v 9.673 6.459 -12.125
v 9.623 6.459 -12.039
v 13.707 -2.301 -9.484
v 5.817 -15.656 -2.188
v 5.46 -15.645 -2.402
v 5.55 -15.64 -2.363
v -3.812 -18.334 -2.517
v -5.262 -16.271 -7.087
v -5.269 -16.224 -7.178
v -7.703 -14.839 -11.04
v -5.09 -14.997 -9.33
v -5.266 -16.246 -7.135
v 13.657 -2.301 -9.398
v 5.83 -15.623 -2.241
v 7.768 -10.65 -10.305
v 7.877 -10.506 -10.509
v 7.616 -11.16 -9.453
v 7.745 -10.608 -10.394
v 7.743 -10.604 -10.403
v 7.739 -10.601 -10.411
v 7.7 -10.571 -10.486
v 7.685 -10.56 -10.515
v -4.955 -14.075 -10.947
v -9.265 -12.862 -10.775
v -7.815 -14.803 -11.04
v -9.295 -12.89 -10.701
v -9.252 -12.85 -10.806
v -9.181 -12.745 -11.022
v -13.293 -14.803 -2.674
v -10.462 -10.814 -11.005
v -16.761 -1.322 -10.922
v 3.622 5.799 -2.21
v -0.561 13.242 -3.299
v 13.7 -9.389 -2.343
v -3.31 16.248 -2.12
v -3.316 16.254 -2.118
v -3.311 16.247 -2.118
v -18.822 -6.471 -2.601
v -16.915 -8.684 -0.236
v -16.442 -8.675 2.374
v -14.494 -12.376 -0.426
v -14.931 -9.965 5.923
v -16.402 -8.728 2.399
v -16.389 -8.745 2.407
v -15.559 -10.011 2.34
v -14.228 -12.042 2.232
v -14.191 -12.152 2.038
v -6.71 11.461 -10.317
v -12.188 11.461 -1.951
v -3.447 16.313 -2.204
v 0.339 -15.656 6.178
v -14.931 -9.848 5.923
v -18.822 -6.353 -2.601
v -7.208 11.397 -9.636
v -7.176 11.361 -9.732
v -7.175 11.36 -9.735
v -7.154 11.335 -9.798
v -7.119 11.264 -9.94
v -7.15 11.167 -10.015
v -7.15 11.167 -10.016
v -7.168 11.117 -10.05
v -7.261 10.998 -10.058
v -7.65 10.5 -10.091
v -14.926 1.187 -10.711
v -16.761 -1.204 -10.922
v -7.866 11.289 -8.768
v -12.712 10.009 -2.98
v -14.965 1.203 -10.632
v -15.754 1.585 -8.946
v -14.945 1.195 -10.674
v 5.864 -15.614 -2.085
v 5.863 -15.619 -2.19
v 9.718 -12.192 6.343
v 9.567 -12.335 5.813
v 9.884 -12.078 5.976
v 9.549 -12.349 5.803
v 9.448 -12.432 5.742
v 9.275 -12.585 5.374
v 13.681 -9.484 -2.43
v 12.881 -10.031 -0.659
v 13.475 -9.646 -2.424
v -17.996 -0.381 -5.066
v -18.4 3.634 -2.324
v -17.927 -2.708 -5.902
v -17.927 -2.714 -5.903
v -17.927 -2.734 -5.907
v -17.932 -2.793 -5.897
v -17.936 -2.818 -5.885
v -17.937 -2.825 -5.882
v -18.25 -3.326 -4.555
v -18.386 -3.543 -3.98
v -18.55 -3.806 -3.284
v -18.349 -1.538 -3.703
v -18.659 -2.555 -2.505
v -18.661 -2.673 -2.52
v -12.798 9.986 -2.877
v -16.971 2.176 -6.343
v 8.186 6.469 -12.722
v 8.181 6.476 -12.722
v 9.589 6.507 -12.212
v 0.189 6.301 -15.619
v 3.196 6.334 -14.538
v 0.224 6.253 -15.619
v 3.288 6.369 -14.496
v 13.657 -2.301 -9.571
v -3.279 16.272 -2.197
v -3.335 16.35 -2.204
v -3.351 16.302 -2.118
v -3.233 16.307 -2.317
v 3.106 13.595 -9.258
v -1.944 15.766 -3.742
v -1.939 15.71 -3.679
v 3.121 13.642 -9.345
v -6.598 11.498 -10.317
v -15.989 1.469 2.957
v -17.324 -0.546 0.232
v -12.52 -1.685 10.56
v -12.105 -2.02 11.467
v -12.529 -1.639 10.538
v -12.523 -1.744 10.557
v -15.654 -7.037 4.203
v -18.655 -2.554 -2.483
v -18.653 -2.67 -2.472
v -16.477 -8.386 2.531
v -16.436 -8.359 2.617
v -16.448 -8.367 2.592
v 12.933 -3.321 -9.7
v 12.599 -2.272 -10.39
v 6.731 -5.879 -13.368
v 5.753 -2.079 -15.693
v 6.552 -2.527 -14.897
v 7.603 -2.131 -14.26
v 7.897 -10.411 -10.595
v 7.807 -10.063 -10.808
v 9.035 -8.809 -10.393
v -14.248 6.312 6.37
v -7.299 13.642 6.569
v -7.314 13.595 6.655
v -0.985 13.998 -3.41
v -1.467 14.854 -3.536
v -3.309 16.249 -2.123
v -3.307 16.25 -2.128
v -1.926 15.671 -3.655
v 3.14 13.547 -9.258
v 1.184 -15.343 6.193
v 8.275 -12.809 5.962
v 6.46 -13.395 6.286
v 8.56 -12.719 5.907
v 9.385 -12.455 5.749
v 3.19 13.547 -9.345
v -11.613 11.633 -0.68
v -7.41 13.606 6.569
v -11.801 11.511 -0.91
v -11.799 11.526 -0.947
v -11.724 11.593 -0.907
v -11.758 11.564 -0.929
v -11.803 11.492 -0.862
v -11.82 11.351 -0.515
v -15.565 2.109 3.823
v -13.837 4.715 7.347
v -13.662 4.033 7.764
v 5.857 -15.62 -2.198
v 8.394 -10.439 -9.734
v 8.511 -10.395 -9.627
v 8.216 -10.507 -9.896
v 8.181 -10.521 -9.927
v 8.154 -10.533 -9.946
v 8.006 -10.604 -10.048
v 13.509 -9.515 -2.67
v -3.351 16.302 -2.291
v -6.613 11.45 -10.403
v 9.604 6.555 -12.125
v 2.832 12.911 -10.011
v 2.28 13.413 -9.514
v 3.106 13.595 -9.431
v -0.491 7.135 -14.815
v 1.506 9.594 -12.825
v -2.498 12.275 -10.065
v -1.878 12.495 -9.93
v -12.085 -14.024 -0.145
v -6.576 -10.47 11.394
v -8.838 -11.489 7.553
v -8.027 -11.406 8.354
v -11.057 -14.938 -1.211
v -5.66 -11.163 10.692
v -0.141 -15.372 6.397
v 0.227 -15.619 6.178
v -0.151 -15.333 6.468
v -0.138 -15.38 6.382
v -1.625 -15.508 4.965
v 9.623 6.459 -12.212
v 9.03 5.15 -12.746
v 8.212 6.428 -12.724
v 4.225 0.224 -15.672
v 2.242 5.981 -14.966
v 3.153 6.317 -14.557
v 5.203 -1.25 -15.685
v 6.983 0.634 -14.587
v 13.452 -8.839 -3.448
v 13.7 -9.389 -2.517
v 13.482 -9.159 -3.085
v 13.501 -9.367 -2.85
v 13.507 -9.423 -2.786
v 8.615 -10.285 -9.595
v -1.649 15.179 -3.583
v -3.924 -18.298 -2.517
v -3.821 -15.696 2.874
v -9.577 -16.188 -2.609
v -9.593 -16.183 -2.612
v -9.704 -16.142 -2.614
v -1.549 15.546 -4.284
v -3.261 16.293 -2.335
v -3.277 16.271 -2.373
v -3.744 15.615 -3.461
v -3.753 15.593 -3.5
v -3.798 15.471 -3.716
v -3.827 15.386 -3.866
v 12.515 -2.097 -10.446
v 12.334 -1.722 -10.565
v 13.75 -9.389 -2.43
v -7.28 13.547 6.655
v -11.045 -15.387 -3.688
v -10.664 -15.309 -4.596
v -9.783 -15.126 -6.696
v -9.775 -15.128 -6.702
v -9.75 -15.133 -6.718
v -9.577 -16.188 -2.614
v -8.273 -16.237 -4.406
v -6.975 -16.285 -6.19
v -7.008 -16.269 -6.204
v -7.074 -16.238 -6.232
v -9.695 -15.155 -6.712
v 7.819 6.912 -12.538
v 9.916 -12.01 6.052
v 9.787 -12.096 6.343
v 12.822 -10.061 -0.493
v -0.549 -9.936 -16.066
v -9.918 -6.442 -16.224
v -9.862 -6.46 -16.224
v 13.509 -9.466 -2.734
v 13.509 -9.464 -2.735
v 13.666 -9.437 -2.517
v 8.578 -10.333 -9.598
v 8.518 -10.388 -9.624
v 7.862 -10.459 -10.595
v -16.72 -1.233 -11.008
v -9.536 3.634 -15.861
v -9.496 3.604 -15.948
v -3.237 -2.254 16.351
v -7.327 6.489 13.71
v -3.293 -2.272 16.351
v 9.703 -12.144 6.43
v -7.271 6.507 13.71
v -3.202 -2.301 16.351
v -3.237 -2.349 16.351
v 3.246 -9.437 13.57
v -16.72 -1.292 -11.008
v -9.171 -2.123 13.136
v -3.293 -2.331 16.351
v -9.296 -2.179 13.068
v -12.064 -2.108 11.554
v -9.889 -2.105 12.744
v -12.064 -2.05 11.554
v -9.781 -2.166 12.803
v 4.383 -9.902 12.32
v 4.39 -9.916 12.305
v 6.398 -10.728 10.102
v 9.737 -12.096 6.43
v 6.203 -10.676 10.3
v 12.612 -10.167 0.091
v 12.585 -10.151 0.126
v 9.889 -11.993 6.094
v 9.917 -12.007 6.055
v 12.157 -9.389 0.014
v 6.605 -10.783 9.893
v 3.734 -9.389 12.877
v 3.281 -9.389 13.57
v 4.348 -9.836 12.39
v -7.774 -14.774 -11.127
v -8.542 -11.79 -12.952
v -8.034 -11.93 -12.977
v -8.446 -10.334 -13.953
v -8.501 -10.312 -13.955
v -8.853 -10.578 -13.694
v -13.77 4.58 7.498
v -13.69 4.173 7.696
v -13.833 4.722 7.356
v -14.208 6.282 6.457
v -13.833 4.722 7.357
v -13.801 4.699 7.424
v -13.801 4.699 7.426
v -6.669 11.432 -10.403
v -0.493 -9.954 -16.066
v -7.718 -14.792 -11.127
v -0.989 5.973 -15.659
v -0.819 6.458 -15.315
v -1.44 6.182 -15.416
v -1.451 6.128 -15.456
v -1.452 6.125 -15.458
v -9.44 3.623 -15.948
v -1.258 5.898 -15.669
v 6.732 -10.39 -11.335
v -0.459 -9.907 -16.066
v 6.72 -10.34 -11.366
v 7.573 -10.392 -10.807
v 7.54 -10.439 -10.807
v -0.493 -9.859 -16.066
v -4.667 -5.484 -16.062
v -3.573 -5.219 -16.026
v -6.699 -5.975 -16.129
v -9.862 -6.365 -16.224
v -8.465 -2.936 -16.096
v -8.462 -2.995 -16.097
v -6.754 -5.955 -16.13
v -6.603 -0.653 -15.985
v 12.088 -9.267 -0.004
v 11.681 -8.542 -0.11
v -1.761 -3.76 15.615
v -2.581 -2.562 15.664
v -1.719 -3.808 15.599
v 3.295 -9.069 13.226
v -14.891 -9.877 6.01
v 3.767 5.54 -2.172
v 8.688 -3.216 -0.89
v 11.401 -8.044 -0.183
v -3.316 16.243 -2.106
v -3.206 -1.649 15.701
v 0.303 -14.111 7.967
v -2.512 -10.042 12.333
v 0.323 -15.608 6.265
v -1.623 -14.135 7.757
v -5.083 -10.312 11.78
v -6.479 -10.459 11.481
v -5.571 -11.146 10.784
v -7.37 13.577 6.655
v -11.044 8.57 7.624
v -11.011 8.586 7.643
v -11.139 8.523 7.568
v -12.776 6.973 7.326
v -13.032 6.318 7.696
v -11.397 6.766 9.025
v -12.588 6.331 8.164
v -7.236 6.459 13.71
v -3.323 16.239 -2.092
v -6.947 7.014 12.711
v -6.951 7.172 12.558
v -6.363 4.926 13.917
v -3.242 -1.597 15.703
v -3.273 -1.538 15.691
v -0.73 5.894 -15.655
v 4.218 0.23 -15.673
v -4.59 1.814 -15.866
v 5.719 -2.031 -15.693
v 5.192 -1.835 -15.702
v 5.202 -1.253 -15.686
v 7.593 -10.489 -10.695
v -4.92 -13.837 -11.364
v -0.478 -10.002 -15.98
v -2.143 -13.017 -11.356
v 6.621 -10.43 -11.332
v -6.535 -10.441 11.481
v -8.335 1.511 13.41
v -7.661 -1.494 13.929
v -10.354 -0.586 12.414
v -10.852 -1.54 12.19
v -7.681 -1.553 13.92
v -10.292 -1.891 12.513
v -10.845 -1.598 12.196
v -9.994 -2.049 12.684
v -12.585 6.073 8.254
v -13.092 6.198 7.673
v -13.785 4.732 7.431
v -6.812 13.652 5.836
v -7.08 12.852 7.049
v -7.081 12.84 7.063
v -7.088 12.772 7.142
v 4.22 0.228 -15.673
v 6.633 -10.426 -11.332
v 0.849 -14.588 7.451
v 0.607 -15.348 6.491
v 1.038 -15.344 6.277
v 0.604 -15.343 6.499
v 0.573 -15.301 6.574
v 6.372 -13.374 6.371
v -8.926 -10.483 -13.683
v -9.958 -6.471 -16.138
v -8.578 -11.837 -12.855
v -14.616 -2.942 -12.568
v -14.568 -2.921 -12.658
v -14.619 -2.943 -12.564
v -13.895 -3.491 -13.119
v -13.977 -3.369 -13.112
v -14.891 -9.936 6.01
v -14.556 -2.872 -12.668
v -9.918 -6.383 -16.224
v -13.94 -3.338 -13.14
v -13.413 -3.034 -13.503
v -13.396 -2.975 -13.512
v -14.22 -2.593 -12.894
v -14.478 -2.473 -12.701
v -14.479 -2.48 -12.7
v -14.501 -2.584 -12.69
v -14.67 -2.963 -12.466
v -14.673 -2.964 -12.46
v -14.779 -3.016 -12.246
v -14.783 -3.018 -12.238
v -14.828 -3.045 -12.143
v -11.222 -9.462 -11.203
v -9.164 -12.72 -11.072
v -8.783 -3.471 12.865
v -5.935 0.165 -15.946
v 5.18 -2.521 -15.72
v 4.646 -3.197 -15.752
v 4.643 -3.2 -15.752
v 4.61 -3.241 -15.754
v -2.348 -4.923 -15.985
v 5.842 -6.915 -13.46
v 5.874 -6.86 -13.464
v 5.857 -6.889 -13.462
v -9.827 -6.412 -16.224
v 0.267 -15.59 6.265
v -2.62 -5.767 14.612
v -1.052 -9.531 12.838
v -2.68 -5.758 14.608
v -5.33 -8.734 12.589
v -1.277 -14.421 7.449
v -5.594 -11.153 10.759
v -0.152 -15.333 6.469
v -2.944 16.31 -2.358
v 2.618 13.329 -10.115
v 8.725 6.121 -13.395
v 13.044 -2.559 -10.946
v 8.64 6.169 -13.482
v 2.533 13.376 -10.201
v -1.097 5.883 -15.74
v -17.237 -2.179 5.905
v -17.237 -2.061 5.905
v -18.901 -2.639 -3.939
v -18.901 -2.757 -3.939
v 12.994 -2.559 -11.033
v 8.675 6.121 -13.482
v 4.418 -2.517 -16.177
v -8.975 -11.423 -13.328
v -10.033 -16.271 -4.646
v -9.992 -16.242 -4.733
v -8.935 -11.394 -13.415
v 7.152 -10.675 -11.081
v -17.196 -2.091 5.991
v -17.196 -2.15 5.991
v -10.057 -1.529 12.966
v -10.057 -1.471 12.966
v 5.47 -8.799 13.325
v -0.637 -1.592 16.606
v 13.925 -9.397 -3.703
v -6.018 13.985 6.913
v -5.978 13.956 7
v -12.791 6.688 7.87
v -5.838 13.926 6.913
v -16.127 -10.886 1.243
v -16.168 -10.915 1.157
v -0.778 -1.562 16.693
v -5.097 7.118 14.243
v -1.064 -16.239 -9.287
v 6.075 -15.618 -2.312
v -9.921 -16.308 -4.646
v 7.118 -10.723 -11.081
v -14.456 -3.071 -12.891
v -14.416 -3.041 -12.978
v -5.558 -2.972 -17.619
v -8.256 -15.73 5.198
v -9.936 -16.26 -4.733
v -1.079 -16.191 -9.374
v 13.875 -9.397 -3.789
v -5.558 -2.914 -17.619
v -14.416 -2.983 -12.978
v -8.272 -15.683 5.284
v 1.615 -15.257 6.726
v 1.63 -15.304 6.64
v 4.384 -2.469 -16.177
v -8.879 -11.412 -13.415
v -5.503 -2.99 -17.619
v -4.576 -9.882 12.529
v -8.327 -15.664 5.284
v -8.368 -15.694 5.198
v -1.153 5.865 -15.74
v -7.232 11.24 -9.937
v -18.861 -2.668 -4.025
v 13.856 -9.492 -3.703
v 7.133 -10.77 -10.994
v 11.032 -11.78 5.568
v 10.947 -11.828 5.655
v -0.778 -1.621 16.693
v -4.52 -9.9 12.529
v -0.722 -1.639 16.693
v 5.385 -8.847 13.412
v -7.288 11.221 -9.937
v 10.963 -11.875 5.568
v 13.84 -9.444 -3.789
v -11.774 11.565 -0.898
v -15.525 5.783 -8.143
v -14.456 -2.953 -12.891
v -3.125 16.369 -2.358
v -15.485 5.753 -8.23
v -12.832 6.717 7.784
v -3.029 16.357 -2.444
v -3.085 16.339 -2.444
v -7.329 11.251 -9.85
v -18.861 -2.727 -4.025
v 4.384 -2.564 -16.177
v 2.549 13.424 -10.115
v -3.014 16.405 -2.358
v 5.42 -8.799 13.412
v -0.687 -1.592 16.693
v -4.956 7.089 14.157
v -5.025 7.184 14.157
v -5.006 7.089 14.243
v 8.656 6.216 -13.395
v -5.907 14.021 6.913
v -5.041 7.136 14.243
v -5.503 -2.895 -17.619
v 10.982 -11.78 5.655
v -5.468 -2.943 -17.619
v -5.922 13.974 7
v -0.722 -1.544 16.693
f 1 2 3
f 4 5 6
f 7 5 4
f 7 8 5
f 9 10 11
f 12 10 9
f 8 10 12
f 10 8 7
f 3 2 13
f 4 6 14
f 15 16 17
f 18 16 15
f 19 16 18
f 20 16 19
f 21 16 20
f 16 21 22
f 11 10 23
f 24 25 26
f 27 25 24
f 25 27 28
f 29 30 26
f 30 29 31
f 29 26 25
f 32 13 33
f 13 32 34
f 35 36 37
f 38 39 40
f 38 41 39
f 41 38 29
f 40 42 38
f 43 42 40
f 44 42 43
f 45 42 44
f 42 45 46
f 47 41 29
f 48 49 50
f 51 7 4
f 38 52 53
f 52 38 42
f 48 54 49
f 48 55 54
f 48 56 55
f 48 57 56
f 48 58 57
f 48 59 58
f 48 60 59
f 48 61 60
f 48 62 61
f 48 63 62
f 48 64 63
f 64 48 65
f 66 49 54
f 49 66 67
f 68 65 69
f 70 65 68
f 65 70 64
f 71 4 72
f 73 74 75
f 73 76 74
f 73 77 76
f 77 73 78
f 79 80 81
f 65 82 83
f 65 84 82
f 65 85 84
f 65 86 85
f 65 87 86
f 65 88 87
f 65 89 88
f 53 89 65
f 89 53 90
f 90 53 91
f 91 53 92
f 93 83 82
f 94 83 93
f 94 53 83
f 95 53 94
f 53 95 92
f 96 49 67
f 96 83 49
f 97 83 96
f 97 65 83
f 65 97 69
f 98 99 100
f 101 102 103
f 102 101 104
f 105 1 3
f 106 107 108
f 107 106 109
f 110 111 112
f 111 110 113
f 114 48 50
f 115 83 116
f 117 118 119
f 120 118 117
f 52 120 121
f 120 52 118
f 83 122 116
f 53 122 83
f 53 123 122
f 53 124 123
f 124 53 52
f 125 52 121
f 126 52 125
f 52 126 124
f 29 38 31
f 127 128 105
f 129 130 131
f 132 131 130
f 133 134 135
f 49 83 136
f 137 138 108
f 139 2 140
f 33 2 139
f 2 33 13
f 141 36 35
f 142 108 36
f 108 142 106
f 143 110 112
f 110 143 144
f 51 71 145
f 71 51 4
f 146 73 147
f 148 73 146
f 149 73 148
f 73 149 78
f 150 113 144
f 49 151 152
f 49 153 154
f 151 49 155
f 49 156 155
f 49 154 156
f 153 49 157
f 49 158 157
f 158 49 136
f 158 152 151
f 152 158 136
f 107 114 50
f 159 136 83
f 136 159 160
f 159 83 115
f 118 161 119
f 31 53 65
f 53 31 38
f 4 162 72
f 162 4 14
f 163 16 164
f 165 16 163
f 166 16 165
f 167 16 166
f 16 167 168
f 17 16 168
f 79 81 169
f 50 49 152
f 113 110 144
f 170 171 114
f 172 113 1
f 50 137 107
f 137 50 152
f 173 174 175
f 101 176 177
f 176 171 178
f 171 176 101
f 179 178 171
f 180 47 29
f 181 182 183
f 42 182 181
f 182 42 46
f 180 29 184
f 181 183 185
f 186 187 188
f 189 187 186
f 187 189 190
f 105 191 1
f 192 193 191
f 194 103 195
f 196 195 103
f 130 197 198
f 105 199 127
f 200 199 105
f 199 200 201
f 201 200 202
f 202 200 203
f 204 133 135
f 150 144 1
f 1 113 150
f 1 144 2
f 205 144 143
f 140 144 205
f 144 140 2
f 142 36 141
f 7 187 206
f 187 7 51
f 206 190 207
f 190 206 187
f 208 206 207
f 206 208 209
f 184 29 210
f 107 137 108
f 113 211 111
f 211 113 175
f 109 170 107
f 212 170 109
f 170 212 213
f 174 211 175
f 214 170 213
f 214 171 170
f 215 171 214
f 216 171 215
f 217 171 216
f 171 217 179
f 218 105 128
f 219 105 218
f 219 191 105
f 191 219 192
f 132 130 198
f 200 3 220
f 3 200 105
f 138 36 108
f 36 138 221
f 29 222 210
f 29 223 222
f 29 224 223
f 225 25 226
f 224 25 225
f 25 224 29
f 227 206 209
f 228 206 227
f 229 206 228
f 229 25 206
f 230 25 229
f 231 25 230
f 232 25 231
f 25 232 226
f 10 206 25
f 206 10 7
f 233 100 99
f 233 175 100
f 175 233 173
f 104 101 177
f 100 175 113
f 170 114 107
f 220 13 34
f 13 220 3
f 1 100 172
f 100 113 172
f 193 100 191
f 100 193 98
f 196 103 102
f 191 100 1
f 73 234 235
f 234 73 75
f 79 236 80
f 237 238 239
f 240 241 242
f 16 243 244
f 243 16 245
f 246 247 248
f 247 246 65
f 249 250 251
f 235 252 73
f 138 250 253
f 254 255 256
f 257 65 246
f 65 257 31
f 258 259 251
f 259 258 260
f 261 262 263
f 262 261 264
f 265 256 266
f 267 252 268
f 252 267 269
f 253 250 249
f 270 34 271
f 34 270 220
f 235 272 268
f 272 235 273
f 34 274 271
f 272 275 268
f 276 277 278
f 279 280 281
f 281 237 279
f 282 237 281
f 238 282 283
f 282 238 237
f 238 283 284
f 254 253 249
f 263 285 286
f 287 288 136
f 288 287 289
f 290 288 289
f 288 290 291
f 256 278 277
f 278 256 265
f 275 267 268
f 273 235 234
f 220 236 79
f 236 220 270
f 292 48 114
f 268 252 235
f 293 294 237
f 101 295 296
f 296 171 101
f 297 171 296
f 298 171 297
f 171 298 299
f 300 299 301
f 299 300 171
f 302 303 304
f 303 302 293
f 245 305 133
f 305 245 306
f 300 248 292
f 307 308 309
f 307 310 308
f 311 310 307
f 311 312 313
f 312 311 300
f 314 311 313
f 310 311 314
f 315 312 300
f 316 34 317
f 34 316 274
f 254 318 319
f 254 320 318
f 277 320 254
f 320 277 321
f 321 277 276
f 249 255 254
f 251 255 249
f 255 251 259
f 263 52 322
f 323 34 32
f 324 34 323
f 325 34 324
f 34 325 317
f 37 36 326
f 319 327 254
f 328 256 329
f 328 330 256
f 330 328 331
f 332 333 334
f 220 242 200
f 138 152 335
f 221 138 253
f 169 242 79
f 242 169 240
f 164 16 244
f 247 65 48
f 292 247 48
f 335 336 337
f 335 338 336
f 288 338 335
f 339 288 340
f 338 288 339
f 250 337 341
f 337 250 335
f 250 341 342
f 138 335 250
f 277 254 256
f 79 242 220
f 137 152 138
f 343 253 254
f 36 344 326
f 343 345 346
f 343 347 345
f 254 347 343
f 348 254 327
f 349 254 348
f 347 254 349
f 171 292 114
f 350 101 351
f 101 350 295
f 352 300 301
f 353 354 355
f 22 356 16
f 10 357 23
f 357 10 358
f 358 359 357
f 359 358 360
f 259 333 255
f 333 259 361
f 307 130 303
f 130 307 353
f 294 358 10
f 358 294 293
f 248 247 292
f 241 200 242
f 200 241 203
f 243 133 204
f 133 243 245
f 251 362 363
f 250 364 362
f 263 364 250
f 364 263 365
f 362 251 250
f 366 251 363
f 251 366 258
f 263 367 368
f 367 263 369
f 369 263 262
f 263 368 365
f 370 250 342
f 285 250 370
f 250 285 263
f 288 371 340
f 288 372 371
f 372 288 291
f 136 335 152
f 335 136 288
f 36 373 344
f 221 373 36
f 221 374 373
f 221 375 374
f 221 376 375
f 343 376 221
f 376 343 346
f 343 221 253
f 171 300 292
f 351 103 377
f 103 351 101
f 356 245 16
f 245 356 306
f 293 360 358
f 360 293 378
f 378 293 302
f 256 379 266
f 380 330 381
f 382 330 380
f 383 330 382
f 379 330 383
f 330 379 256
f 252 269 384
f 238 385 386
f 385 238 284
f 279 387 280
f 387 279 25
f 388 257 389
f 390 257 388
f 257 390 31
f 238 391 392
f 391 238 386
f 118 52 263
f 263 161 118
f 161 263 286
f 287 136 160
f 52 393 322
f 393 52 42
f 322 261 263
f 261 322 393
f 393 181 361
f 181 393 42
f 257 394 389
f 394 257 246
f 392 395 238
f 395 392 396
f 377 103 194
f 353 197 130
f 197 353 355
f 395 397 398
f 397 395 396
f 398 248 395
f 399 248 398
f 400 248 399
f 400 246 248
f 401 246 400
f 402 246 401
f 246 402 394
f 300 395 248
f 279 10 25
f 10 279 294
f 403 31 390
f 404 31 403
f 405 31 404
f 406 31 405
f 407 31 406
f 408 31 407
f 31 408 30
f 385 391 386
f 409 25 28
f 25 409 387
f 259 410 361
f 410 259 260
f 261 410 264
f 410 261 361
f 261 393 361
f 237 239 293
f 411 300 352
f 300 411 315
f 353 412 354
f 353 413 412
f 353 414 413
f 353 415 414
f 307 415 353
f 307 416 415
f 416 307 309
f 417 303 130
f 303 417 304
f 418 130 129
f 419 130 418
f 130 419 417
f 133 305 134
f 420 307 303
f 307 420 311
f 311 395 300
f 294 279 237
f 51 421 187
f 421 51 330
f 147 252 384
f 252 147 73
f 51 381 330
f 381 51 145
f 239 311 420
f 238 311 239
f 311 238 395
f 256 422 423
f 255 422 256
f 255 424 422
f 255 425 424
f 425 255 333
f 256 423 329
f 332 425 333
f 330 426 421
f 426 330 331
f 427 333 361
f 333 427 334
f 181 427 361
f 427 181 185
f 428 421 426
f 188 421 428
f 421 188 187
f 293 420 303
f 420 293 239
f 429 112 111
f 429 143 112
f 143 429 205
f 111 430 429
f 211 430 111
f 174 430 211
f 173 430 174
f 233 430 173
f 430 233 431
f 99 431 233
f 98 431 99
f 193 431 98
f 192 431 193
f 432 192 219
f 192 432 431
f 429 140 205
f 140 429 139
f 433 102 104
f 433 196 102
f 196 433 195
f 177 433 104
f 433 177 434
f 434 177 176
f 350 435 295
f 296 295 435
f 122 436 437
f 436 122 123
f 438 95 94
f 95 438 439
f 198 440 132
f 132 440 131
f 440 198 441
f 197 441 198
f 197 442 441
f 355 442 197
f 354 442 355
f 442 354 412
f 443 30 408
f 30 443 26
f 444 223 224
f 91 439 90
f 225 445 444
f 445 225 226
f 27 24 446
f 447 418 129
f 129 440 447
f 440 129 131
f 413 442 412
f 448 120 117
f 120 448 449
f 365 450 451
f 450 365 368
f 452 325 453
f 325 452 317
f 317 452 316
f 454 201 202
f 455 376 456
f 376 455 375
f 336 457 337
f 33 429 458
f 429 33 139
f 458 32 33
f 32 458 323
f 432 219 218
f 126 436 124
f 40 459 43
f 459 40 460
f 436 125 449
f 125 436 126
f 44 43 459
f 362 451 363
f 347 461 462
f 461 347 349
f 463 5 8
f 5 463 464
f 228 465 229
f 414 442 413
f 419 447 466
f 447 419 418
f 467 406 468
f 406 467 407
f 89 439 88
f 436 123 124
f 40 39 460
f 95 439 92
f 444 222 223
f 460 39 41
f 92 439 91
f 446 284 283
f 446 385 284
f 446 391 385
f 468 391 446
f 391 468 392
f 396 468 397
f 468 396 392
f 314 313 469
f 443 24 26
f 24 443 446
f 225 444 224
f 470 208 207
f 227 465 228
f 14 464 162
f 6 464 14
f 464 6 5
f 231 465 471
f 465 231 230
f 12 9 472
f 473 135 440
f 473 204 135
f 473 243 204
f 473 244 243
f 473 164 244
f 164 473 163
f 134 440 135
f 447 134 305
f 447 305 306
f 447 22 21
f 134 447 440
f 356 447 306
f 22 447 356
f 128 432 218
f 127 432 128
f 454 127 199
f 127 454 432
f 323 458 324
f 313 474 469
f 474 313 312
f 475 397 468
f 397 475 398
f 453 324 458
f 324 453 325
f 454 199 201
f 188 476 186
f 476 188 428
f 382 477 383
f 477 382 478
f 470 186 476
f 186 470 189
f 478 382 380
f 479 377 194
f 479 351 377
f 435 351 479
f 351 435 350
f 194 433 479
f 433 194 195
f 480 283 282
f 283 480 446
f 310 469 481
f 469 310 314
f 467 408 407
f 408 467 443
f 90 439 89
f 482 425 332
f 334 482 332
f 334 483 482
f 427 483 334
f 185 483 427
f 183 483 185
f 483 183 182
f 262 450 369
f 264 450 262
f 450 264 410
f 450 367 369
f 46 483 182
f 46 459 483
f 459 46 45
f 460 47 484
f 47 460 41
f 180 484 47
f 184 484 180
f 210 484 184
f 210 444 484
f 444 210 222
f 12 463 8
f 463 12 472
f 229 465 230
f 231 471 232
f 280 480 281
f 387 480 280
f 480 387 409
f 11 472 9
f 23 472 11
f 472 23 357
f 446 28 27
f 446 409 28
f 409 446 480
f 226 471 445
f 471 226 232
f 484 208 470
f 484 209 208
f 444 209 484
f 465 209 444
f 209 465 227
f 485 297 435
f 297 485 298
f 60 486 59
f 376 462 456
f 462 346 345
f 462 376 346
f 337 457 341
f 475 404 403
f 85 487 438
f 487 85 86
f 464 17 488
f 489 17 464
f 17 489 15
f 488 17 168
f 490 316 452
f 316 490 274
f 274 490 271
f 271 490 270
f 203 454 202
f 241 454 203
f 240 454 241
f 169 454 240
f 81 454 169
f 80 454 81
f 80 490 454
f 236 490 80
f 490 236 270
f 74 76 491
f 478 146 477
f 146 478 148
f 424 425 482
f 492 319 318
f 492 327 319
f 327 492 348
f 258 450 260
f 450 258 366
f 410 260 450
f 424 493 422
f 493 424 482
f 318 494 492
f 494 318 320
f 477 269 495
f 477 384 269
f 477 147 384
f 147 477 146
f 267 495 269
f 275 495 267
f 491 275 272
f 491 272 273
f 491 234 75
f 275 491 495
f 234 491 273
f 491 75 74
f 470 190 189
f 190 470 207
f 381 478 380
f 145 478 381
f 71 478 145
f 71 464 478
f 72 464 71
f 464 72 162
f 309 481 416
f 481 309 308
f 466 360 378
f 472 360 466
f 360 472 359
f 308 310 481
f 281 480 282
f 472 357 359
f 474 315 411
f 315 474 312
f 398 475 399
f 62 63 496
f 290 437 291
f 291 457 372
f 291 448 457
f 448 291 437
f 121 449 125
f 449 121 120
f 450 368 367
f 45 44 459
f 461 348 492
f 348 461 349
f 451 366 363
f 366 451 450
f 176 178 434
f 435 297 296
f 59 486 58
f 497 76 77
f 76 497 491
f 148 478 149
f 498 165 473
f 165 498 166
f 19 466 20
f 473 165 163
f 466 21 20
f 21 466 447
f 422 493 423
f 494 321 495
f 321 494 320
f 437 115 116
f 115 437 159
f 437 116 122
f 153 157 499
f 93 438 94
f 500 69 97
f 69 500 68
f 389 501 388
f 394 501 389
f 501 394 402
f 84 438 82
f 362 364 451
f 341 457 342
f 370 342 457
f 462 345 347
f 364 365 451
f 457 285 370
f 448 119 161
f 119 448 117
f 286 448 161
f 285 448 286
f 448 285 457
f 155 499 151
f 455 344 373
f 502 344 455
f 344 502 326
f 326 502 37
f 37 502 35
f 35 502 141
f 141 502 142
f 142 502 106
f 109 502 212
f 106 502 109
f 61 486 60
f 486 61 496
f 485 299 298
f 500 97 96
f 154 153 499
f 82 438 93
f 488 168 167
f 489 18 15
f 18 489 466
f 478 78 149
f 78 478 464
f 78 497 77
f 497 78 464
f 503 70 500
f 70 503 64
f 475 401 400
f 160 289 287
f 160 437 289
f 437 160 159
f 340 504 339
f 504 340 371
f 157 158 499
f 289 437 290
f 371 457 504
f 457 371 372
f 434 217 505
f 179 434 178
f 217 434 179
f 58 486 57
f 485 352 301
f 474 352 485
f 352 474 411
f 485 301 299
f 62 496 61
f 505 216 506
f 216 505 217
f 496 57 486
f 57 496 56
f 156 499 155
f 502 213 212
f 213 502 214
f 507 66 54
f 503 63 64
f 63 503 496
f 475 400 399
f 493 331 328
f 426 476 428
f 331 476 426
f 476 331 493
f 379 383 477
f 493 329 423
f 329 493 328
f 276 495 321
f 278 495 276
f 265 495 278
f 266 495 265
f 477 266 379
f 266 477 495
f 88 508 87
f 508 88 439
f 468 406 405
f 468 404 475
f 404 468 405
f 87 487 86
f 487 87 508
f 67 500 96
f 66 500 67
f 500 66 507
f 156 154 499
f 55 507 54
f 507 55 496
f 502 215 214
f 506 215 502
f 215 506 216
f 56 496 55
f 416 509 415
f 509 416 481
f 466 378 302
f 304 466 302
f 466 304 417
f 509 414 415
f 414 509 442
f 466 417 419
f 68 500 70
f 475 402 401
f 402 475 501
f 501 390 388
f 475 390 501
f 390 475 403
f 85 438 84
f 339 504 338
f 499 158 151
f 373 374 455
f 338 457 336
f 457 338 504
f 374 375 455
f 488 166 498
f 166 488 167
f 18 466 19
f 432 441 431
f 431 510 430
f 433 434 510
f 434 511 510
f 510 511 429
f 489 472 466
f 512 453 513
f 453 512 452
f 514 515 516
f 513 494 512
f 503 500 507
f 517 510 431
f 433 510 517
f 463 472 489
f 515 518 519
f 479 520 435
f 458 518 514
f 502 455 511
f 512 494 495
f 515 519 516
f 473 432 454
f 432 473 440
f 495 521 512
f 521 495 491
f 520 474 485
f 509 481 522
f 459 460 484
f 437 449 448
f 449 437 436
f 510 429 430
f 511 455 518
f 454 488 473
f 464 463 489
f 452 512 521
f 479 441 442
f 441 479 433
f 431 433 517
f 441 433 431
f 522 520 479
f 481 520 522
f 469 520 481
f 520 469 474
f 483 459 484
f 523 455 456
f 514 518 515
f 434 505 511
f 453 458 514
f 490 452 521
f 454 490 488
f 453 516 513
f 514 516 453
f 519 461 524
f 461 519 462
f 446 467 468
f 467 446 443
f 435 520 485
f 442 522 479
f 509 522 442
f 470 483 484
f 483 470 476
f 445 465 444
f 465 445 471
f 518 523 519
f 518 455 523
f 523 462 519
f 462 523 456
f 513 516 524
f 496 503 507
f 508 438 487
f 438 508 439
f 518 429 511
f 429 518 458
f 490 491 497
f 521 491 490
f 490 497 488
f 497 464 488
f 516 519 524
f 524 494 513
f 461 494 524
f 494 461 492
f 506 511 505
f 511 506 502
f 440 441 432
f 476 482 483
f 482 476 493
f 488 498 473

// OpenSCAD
// Auto-generated OpenSCAD file

    inner_points = 10*[[-0.45355703407615483, -0.9852604747027949, 1.2442629448836795], [-0.11128666904117222, 0.5835651383085163, -1.565322994036517], [-1.0016741042155215, -0.15000111337832142, 1.287960504788888], [0.1599278591139769, -1.520900805152802, 0.6639822178016064], [-0.7247715622313039, 1.119205468758524, -0.9850422669544439], [0.43683040109819454, -0.25169422301595684, -1.6090205539417255], [-1.2750612603248952, 0.6658365922161982, 0.7783839148588771], [0.604450197740842, -1.5523257042416663, -0.23123416172848094], [-1.1692939008581689, 1.150630367847388, -0.08982588742435665], [0.7102175572075684, -1.0675319286104765, -1.0994439640117146], [-0.07373926097703089, -0.15917918368749281, 1.6605899316050716], [0.5369510310439554, -0.879903803247868, 1.3325451328490563], [0.25177920002421017, 1.3328626384976536, -1.0114850836962188], [0.8624694920451964, 0.6121380189372783, -1.3395298824522341], [-0.5056295914533497, 0.708853913520469, 1.415662831037149], [1.0931783496571914, -1.1780276370174307, 0.5568303980612812], [-0.3044481185890256, 1.6309864722672165, -0.23577034890844362], [1.2943598225215154, -0.2558950782706834, -1.0946027818843114], [-0.5937525335554718, 1.3926363486024174, 0.691317658796271], [1.3824827646236373, -0.9396775133526316, -0.3702576096434335], [-0.8286998825229884, -1.5635001676990283, 0.5197584930665651], [-0.5517973405387707, -0.2942935855621831, -1.7532442786767668], [-1.715571931822494, -0.2120221316545012, 0.5904626302186273], [-1.5444367493050026, 0.5723906748511545, -0.8143303392414709], [-0.10944762986613042, -1.614346722517846, -0.9287320362987417], [-1.608667983638949, -1.0856125902905323, 0.11568767674818647], [-1.4375328011214579, -0.30119978378487644, -1.2891052927119118], [-0.9951830904488174, -1.6212529207405393, -0.4645930503338865], [-0.889415730982091, -1.1364591451093493, -1.3328028526171203], [-1.8820551397483227, -0.2697748846960123, -0.39388891318182445]];

    outer_points = 10*[[-1.2023976649193235, -0.20790108708079238, 1.1467271385135702], [0.5703055554767221, -0.20790108708079238, -1.5606072049684219], [-1.4167473948229383, 0.6253103044559617, 0.6370086178537524], [-0.649491745903262, -1.0411124786175465, 1.139390809023269], [0.01739963646066056, 0.6253103044559617, -1.5532708754781206], [0.7846552853803369, -1.0411124786175465, -1.050888684308604], [-1.210666624270285, 1.1402632642392723, -0.19506960275945007], [0.0307790937421078, -1.5560654384008572, 0.6178018578954751], [-0.662871203184709, 1.1402632642392723, -1.0316819243503268], [0.5785745148276837, -1.5560654384008572, -0.21881046369540158], [-0.7286095026793453, 0.645946238583741, 1.3622950437703323], [-0.32523933709311637, -0.2301440644221562, 1.6264129918427295], [0.9573314465357177, 0.645946238583741, -1.2125329253878778], [1.3607016121219466, -0.2301440644221562, -0.9484149773154806], [-0.7329567518749942, 1.354718182322609, 0.6568707507430379], [0.32308005167742637, -0.9389160081610243, 1.3483405158354533], [0.30901205776517493, 1.354718182322609, -0.9344604493806018], [1.3650488613175955, -0.9389160081610243, -0.24299068428818626], [-0.336620583244891, 1.6254449745585284, -0.22041178379259257], [0.9687126926874923, -1.2096428003969435, 0.6342918502474442], [-1.4850387512679277, -0.9906633299119916, 0.5922929336654642], [-0.05089171998432884, -0.9906633299119916, -1.597986559666409], [-1.8318638997313361, 0.35750102140807305, -0.23244895745743688], [-0.9455122895333135, 0.35750102140807305, -1.586116129198433], [-0.3843374111662901, -1.8238747214487456, -0.2516557174157139], [-1.874070279152174, -0.6412256095550173, -0.26008477011600517], [-0.9877186689541513, -0.6412256095550173, -1.6137519418570012], [-1.3211643601361125, -1.4744370010917713, -0.26742109960630656], [-0.7733689390505365, -1.4744370010917713, -1.1040334211971832], [-1.6679895085995209, -0.12627264977170682, -1.0921629907292074]];

    // Convex hull for inner set (I)
    module inner_hull() {
        hull() {
            for (p = inner_points) {
                translate(p) sphere(r=0.1);
            }
        }
    }

    // Convex hull for outer set (O) minus inner hull (O \ I)
    module outer_minus_inner() {
        difference() {
            hull() {
                for (p = outer_points) {
                    translate(p) sphere(r=0.1);
                }
            }
            inner_hull(); // Subtract inner hull
        }
    }

    // Convex hull for outer set (O) minus all translated inner hulls
    module outer_minus_AllTranslationInner() {
        difference() {
            hull() {
                for (p = outer_points) {
                    translate(p) sphere(r=0.1);
                }
            }
            hull() {
                translate([0,0,50]) inner_hull();
                translate([0,0,-50]) inner_hull();
            }; // Subtract translated inner hulls
        }
    }

    // Difference between outer_minus_inner and outer_minus_AllTranslationInner
    module outer_minus_inner_diff() {
        difference() {
            // Outer minus inner
            difference() {
                hull() {
                    for (p = outer_points) {
                        translate(p) sphere(r=0.1);
                    }
                }
                inner_hull();
            }

            // Subtract Outer minus AllTranslationInner
            difference() {
                hull() {
                    for (p = outer_points) {
                        translate(p) sphere(r=0.1);
                    }
                }
                hull() {
                    translate([0,0,50]) inner_hull();
                    translate([0,0,-50]) inner_hull();
                };
            }
        }
    }

    // Rendering all with colors applied
    color([1, 0, 0, 0.5]) inner_hull(); // Transparent red
    color([0, 1, 0, 1]) outer_minus_AllTranslationInner(); // Opaque green
    color([1, 1, 0, 1]) outer_minus_inner_diff(); // Opaque yellow
    
